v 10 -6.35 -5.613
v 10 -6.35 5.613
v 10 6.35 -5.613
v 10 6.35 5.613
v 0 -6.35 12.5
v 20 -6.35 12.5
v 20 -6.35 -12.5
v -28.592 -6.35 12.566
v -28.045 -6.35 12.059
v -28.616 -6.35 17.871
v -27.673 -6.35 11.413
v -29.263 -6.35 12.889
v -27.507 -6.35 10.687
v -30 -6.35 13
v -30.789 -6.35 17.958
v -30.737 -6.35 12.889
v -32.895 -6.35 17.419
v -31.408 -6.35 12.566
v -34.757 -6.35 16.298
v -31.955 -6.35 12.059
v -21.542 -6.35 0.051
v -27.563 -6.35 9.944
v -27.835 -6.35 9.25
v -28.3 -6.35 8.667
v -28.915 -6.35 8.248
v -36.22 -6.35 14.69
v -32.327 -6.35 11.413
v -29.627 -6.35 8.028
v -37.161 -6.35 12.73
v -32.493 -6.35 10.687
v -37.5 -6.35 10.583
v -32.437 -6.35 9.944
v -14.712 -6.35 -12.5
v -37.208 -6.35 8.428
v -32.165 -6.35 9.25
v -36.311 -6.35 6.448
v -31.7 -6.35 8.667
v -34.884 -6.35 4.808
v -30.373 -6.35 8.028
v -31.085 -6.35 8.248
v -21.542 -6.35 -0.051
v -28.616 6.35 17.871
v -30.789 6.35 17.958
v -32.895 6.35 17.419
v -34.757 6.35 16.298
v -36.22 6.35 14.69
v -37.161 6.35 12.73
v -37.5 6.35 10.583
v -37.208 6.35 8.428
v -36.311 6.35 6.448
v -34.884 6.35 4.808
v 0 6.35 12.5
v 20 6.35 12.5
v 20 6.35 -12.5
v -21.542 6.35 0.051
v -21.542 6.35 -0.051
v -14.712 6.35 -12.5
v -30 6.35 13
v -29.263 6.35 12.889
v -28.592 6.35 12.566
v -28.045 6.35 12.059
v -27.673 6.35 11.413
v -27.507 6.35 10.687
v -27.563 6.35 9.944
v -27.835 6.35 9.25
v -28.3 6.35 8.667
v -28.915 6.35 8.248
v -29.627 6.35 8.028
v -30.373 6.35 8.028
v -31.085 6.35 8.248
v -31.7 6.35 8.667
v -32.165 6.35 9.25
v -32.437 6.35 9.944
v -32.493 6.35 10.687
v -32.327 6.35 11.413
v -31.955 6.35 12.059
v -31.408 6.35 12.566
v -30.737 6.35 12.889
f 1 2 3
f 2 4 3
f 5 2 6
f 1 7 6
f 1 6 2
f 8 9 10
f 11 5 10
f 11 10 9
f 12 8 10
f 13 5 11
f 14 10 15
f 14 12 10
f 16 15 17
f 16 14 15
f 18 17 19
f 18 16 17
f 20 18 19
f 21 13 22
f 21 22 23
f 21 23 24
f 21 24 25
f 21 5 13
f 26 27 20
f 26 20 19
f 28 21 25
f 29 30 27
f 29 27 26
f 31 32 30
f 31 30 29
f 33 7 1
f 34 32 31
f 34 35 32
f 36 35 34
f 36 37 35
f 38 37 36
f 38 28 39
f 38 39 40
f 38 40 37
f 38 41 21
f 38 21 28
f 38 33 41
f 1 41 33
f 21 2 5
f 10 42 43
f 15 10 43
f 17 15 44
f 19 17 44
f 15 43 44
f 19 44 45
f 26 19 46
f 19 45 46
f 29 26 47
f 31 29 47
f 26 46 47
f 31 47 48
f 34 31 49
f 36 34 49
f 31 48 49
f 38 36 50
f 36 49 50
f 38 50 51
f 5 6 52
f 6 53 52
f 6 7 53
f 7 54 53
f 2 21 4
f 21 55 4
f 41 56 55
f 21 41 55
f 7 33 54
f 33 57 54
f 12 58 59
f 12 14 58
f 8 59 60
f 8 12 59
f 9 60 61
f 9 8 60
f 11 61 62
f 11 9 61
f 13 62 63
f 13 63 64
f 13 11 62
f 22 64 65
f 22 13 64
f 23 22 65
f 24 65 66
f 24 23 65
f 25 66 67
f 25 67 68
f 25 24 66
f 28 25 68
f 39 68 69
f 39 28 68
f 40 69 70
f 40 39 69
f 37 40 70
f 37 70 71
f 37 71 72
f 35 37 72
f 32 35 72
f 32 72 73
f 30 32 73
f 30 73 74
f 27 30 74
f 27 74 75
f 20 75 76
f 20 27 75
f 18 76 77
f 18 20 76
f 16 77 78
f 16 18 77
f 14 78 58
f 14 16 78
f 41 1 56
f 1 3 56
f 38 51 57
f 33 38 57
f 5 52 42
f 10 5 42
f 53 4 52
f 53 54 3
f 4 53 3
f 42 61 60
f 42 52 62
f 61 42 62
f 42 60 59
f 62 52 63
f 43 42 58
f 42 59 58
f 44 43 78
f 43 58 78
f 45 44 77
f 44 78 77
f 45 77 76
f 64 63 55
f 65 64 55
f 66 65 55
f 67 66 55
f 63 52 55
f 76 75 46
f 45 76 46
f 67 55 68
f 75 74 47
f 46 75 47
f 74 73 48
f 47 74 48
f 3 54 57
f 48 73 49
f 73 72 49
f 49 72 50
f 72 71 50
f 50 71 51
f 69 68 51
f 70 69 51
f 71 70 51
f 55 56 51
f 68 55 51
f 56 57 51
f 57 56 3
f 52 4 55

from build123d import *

# Parameters (mm, degrees)
SKETCH2_R           = 2.5
BOSS_EXTRUDE1_DEPTH = 6.35


with BuildPart() as part:
    # Sketch2 → Boss-Extrude1 (new, symmetric)
    with BuildSketch(Plane(origin=(0, 0, 0), x_dir=(1, 0, 0), z_dir=(0, 1, 0))):
        with BuildLine():
            Line((-34.883854573, -4.808079014), (-14.712038095, 12.5))
            Line((-14.712038095, 12.5), (20, 12.5))
            Line((20, 12.5), (20, -12.5))
            Line((20, -12.5), (0, -12.5))
            Line((0, -12.5), (-28.616418364, -17.871275457))
            ThreePointArc((-28.616418364, -17.871275457), (-36.762008058, -13.74426371), (-34.883854573, -4.808079014))
        make_face()
        with Locations(Location((-30, -10.5, 0), (0, 0, 270))):
            Circle(SKETCH2_R, mode=Mode.SUBTRACT)
        Polygon((-21.542043285, 0.051346502), (-21.542043285, -0.051346502), (10, -5.61305976), (10, 5.61305976), align=None, mode=Mode.SUBTRACT)
    extrude(amount=BOSS_EXTRUDE1_DEPTH, both=True)


solid = part.part
